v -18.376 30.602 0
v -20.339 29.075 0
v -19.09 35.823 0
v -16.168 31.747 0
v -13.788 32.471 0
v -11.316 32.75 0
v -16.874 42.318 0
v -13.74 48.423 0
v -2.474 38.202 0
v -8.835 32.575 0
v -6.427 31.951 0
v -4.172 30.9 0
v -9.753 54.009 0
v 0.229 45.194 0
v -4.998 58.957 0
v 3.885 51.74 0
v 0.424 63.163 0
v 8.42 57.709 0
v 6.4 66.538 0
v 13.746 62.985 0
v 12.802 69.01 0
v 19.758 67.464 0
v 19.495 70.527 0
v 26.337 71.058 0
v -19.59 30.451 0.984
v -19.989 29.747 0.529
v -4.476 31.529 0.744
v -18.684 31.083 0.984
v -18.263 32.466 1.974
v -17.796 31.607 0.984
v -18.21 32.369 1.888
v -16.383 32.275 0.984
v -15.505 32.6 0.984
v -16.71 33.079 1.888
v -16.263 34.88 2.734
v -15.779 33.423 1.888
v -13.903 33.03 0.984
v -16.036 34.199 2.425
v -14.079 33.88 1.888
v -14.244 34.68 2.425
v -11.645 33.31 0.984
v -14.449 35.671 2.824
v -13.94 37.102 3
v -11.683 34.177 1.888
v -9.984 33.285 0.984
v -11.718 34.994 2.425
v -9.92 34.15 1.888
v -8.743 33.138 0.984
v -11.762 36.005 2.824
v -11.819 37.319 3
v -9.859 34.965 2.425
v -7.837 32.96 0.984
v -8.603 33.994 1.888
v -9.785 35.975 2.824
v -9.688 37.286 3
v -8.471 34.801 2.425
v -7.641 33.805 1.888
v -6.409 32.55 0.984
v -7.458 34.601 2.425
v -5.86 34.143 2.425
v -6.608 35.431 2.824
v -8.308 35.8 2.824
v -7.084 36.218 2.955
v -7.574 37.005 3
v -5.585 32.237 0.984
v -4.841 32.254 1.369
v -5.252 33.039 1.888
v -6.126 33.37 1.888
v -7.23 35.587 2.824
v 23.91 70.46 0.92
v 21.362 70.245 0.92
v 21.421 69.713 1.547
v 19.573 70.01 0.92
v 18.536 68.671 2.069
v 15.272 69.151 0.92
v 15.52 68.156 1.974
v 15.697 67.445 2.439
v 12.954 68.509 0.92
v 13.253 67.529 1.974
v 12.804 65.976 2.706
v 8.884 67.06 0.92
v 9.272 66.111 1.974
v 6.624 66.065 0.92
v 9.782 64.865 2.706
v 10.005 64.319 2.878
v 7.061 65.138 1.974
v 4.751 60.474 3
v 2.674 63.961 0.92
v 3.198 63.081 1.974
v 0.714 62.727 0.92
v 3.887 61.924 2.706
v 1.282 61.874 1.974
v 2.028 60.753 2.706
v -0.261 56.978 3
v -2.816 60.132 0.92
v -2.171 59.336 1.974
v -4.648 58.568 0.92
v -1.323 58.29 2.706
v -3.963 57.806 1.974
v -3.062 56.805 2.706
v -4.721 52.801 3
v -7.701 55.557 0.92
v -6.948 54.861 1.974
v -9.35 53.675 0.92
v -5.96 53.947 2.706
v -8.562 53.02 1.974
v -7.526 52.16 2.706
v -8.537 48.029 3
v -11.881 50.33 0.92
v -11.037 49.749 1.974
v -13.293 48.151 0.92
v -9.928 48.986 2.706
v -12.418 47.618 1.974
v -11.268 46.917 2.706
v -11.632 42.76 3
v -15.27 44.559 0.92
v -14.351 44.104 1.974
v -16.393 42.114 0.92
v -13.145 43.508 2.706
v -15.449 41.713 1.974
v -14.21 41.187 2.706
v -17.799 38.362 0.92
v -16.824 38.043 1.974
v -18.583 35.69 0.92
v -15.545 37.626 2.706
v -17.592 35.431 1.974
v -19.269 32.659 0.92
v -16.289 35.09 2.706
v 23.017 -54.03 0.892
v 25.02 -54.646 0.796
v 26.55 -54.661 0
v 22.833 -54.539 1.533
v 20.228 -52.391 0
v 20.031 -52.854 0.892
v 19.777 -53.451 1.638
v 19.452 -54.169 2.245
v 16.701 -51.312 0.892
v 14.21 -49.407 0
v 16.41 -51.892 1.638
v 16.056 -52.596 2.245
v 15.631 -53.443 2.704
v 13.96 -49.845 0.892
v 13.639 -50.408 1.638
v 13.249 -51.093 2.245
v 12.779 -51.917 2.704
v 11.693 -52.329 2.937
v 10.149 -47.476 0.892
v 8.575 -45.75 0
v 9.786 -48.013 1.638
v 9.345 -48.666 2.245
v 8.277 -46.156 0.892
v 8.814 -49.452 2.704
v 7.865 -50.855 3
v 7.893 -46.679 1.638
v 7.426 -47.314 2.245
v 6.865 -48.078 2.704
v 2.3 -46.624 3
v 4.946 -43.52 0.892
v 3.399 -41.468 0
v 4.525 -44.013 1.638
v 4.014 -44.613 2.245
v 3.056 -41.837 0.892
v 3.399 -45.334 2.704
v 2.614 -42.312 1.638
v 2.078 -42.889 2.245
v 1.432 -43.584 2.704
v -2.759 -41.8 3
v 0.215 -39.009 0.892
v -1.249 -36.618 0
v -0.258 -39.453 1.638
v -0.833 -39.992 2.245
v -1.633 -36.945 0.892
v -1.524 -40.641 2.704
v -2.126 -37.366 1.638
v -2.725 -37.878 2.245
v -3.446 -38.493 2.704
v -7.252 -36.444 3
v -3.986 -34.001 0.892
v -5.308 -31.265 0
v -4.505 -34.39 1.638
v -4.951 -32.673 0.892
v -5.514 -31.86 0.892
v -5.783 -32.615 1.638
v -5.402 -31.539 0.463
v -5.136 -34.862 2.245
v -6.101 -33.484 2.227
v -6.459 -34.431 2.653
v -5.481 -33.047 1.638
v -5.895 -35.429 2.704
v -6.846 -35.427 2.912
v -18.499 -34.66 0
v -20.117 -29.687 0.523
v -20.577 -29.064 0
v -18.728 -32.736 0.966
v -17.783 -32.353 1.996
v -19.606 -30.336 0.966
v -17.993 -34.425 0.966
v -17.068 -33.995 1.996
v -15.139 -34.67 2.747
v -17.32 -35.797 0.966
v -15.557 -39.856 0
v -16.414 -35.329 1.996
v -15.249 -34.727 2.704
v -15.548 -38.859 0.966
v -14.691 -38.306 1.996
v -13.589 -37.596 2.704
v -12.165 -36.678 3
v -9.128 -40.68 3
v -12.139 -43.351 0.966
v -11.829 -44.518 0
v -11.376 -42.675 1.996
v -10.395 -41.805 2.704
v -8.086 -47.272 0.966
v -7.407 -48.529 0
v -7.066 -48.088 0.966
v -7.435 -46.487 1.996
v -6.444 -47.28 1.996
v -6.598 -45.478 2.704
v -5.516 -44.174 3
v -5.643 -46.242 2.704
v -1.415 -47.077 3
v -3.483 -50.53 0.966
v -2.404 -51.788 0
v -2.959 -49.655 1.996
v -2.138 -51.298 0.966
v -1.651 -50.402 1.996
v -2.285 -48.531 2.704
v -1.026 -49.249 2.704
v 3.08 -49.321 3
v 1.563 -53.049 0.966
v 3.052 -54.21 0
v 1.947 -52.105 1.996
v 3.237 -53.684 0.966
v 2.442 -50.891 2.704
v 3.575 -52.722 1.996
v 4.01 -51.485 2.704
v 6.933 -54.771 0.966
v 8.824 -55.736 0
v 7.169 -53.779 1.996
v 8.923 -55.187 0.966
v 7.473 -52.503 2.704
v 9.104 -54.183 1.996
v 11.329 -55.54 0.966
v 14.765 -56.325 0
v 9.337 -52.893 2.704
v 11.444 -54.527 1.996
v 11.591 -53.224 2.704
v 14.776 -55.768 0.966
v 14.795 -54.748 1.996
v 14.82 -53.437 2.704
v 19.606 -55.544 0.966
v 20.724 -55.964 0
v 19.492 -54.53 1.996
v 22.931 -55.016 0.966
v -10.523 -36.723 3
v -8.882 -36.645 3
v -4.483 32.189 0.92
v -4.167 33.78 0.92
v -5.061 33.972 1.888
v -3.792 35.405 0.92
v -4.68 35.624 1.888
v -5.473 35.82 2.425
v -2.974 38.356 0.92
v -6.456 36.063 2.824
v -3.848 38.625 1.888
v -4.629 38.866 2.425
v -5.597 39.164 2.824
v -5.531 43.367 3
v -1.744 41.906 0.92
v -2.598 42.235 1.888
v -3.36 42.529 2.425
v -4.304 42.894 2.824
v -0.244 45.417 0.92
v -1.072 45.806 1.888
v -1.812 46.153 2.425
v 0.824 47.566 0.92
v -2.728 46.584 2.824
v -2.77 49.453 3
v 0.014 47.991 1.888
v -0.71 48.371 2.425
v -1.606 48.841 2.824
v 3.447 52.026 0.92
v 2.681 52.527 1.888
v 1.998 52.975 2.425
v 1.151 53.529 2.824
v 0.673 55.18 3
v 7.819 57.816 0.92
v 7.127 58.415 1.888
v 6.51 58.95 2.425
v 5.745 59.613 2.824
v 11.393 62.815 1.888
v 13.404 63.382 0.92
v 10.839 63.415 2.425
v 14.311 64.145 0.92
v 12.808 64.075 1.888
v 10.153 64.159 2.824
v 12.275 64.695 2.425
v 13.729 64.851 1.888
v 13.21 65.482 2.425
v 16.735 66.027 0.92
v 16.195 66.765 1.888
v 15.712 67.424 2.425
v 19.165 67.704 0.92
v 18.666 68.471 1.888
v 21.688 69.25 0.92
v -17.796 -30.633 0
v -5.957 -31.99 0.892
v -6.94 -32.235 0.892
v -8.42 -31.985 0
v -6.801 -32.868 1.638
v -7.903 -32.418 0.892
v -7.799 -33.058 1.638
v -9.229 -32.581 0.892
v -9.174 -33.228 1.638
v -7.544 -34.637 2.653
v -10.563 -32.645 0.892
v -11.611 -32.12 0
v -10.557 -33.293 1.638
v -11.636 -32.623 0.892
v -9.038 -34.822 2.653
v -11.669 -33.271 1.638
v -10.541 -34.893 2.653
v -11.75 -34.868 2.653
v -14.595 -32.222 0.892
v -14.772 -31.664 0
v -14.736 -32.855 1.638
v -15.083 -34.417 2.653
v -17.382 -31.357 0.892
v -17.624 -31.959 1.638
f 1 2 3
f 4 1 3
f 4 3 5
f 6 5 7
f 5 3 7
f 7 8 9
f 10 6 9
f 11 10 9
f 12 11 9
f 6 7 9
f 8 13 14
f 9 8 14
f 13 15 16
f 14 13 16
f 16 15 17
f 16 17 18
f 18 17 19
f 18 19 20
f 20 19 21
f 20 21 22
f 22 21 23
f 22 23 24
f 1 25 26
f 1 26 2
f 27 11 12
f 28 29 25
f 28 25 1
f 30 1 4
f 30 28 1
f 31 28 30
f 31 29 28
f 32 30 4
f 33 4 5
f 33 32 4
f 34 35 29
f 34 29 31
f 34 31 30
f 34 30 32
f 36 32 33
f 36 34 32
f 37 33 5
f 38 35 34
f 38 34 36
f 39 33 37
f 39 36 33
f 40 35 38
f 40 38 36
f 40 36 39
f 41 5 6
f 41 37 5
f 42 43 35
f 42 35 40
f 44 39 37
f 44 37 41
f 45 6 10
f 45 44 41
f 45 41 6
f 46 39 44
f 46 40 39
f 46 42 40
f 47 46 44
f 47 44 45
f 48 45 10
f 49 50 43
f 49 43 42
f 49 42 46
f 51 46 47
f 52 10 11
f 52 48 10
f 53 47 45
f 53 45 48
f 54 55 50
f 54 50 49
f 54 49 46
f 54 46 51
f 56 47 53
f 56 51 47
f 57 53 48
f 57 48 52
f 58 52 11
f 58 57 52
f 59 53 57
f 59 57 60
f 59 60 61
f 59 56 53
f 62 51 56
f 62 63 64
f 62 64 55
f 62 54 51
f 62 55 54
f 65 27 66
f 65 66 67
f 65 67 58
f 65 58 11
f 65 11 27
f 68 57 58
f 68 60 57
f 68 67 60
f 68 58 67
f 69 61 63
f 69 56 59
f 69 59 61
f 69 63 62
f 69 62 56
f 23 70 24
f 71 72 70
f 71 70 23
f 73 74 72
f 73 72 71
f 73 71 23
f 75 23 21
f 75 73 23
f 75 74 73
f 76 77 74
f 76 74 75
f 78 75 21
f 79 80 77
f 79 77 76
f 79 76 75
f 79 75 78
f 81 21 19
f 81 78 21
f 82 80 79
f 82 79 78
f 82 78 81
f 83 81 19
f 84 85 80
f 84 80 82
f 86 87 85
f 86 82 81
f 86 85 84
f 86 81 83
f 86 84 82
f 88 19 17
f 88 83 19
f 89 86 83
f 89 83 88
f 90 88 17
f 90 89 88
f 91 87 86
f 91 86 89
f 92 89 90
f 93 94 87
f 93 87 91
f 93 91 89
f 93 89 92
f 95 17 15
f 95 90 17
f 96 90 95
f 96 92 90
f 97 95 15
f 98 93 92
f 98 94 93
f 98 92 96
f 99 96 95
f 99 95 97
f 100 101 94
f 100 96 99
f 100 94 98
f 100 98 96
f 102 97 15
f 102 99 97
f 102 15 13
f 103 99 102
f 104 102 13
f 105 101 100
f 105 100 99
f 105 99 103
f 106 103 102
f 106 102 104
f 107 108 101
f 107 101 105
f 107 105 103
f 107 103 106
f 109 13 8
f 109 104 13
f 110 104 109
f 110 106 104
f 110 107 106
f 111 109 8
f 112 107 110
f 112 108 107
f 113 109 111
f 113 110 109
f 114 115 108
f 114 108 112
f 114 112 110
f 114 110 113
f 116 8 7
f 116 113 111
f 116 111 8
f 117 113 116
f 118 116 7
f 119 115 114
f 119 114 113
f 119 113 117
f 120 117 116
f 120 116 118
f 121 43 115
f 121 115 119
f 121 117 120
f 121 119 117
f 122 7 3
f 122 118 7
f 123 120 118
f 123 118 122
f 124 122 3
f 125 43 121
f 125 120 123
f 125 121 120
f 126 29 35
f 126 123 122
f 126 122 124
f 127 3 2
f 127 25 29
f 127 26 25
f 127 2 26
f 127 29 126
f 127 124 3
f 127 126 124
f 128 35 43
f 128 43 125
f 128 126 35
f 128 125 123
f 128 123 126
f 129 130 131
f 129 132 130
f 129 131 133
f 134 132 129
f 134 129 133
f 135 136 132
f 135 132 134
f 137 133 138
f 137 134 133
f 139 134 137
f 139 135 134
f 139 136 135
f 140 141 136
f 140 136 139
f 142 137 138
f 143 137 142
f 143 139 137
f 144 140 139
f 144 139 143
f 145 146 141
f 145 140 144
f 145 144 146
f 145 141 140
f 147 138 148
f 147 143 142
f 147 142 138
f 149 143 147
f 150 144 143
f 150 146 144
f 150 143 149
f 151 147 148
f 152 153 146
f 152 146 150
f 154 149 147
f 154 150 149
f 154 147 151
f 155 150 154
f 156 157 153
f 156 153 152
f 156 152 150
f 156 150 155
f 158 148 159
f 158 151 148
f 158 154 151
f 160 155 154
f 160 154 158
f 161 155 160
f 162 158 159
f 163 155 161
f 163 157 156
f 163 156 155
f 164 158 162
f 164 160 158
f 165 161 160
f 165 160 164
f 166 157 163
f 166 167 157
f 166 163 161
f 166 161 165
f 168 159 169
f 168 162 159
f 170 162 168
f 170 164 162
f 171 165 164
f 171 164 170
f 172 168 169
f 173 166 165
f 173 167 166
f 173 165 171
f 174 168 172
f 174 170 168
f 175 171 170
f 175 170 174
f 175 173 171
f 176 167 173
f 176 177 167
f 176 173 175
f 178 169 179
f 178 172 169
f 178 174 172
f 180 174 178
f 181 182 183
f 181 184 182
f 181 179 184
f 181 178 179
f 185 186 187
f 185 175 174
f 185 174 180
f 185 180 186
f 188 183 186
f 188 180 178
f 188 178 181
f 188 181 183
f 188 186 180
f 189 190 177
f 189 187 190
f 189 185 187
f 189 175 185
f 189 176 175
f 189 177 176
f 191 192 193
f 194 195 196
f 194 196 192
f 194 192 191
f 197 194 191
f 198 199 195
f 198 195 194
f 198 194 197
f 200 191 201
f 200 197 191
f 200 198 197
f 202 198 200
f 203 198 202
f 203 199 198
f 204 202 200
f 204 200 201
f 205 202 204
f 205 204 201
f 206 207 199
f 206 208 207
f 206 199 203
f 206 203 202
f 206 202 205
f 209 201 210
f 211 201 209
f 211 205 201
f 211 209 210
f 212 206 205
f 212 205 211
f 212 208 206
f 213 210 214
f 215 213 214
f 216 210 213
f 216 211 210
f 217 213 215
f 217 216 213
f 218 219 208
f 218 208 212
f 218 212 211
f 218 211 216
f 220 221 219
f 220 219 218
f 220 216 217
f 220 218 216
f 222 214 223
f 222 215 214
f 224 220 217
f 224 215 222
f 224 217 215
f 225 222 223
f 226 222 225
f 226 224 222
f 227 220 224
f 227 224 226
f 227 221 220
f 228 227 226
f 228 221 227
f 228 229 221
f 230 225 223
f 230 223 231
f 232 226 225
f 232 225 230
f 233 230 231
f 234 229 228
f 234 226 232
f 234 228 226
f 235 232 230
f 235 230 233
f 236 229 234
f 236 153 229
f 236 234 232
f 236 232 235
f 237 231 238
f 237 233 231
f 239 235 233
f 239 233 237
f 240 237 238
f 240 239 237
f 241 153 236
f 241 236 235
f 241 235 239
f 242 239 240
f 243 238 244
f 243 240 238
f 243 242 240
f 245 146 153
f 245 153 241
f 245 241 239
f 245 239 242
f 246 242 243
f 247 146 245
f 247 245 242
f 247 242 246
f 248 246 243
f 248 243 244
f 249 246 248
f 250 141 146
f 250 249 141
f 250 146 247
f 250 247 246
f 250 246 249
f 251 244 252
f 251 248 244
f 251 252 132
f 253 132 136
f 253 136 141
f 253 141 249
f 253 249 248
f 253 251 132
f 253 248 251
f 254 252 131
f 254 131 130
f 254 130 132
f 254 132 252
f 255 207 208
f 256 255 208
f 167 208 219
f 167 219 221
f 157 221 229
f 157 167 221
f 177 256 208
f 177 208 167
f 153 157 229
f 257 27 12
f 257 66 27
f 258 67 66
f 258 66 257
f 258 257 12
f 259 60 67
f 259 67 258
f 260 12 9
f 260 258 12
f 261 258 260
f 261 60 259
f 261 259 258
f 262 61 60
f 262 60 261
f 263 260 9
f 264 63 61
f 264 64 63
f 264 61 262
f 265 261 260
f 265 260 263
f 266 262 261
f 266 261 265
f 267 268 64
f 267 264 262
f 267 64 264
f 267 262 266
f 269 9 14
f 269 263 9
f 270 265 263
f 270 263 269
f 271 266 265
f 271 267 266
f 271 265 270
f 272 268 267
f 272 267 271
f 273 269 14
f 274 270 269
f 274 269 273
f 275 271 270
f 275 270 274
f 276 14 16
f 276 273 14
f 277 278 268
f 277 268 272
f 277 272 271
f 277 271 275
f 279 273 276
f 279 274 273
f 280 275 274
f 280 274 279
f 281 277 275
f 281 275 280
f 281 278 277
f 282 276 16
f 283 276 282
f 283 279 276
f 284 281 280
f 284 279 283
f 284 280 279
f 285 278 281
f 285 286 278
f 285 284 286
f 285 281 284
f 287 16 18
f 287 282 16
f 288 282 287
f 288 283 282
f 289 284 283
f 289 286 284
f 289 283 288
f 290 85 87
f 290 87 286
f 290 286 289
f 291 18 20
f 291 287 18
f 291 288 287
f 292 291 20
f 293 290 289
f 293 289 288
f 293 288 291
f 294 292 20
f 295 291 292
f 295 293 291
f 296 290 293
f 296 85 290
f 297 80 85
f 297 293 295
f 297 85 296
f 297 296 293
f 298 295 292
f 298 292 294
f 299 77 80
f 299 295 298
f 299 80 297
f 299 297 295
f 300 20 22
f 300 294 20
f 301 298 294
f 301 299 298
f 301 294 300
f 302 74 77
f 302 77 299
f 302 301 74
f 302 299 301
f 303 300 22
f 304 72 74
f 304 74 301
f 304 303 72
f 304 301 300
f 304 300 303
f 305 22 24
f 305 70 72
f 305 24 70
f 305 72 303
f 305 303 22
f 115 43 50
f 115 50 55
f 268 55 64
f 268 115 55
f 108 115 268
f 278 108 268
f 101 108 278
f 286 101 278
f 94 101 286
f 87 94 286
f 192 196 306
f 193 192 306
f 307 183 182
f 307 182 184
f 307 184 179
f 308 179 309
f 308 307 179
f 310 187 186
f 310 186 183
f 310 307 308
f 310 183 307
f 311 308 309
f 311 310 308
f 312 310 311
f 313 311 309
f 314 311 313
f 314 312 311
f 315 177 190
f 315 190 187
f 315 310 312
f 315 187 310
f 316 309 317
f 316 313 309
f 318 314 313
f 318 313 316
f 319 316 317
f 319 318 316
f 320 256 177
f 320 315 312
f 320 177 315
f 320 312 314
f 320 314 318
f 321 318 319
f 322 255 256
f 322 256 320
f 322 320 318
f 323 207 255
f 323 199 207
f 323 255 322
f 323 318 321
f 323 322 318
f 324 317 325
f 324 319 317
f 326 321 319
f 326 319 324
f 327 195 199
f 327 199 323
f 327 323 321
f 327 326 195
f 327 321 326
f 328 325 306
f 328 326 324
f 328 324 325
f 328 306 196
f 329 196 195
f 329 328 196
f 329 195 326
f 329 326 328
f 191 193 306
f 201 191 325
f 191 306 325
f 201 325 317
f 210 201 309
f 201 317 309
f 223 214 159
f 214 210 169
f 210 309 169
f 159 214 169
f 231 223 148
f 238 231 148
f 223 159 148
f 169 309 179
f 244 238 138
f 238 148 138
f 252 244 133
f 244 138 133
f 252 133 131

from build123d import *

# Parameters (mm, degrees)
F4_DEPTH      = 3
F5_T2_ANGLE   = 62.2477049864
F5_T4_ANGLE   = 129.1340791789
F5_T6_ANGLE   = 126.4050370347
F5_2_T2_ANGLE = 80.8778277447
F5_2_T4_ANGLE = 111.257856834
F5_2_T6_ANGLE = 169.7853810378


# Not quite as in the source:
# - a fillet or chamfer that OpenCascade refuses, or shapes differently, is made with other operations: its cross-section is extruded or revolved along the edge and cut away or added
# - a feature of the source that left no trace in its solid (it failed there, or was rolled back) is left out
# - the program builds the solid bodies; features that only make, move or delete a surface that nothing else refers to are left out


with BuildPart() as f4:
    # F3 (on Top) → F4 (new body)
    with BuildSketch(Plane.XY):
        with BuildLine():
            ThreePointArc((-5.3077070042, -31.2650799751), (-13.2021361292, -31.9649934775), (-20.5774232745, -29.0637817234))
            ThreePointArc((-20.5774232745, -29.0637817234), (-2.4043363453, -51.7875856508), (26.5503625851, -54.6612180769))
            ThreePointArc((26.5503625851, -54.6612180769), (8.5747716437, -45.7499050222), (-5.3077070042, -31.2650799751))
        make_face()
    extrude(amount=F4_DEPTH)

    # F5: fillet of radius 5 on 3 edges, made by hand

    # F5_s1 → F5_t2 (revolve, cut)
    with BuildSketch(Plane(origin=(42.5768459914, -3.8517260252, 0), x_dir=(0, 0, 1), z_dir=(0.9959329635, -0.0900973481, 0))):
        with BuildLine():
            ThreePointArc((0, 53.1706891683), (2.1833001327, 55.0146520758), (3, 57.7532648633))
            Line((3, 57.7532648633), (3, 53.1706891683))
            Line((3, 53.1706891683), (0, 53.1706891683))
        make_face()
    revolve(axis=Axis((43.0309999283, 1.1684758534, 3), (0, 0, -1)), revolution_arc=F5_T2_ANGLE, mode=Mode.SUBTRACT)

    # F5_s3 → F5_t4 (revolve, cut)
    with BuildSketch(Plane(origin=(-10.1562466974, -15.2654101251, 0), x_dir=(0, 0, 1), z_dir=(0.5539186056, 0.8325708248, 0))):
        with BuildLine():
            ThreePointArc((0, 16.5640855704), (2.1833001327, 18.4080484779), (3, 21.1466612654))
            Line((3, 21.1466612654), (3, 16.5640855704))
            Line((3, 16.5640855704), (0, 16.5640855704))
        make_face()
    revolve(axis=Axis((-10.7388300445, -14.8778109616, 3), (0, 0, -1)), revolution_arc=F5_T4_ANGLE, mode=Mode.SUBTRACT)

    # F5_s5 → F5_t6 (revolve, cut)
    with BuildSketch(Plane(origin=(-0.548879568, -18.3736765408, 0), x_dir=(0, 0, 1), z_dir=(0.029859828, 0.9995540959, 0))):
        with BuildLine():
            ThreePointArc((0, -21.4392018096), (2.1833001327, -19.5952389021), (3, -16.8566261146))
            Line((3, -16.8566261146), (3, -21.4392018096))
            Line((3, -21.4392018096), (0, -21.4392018096))
        make_face()
    revolve(axis=Axis((15.4842666098, -18.8526370977, 3), (0, 0, 1)), revolution_arc=F5_T6_ANGLE, mode=Mode.SUBTRACT)


with BuildPart() as f4b:
    # F3 (on Top) → F4, piece 2 (new body)
    with BuildSketch(Plane.XY):
        with BuildLine():
            ThreePointArc((-4.1721854359, 30.9002492577), (6.0474831917, 54.8040980412), (26.3369232416, 71.057535708))
            ThreePointArc((26.3369232416, 71.057535708), (-4.9982200607, 58.9572788508), (-20.3394051641, 29.0749184787))
            ThreePointArc((-20.3394051641, 29.0749184787), (-12.5583392109, 32.6672592136), (-4.1721854359, 30.9002492577))
        make_face()
    extrude(amount=F4_DEPTH)

    # F5#2: fillet of radius 5 on 3 edges, made by hand

    # F5_2_s1 → F5_2_t2 (revolve, cut)
    with BuildSketch(Plane(origin=(-1.1051572436, 19.683889291, 0), x_dir=(0, 0, 1), z_dir=(0.0560569838, -0.998427571, 0))):
        with BuildLine():
            ThreePointArc((0, 3.6571197259), (2.1833001327, 5.5010826334), (3, 8.2396954209))
            Line((3, 8.2396954209), (3, 3.6571197259))
            Line((3, 3.6571197259), (0, 3.6571197259))
        make_face()
    revolve(axis=Axis((48.6007815653, 22.4746425569, 3), (0, 0, -1)), revolution_arc=F5_2_T2_ANGLE, mode=Mode.SUBTRACT)

    # F5_2_s3 → F5_2_t4 (revolve, cut)
    with BuildSketch(Plane(origin=(19.5896273479, -4.7607351825, 0), x_dir=(0, 0, 1), z_dir=(0.9717166727, -0.2361497577, 0))):
        with BuildLine():
            ThreePointArc((0, -76.6524312792), (2.1833001327, -74.8084683718), (3, -72.0698555843))
            Line((3, -72.0698555843), (3, -76.6524312792))
            Line((3, -76.6524312792), (0, -76.6524312792))
        make_face()
    revolve(axis=Axis((26.5503625851, 23.8815236574, 3), (0, 0, 1)), revolution_arc=F5_2_T4_ANGLE, mode=Mode.SUBTRACT)

    # F5_2_s5 → F5_2_t6 (revolve, cut)
    with BuildSketch(Plane(origin=(-0.4514250872, 19.3811668147, 0), x_dir=(0, 0, 1), z_dir=(0.0232856303, -0.999728853, 0))):
        with BuildLine():
            ThreePointArc((0, 24.2003972309), (2.1833001327, 26.0443601383), (3, 28.7829729258))
            Line((3, 28.7829729258), (3, 24.2003972309))
            Line((3, 24.2003972309), (0, 24.2003972309))
        make_face()
    revolve(axis=Axis((-11.0304768119, 19.1347601151, 3), (0, 0, -1)), revolution_arc=F5_2_T6_ANGLE, mode=Mode.SUBTRACT)


solid = Compound([f4.part, f4b.part])
